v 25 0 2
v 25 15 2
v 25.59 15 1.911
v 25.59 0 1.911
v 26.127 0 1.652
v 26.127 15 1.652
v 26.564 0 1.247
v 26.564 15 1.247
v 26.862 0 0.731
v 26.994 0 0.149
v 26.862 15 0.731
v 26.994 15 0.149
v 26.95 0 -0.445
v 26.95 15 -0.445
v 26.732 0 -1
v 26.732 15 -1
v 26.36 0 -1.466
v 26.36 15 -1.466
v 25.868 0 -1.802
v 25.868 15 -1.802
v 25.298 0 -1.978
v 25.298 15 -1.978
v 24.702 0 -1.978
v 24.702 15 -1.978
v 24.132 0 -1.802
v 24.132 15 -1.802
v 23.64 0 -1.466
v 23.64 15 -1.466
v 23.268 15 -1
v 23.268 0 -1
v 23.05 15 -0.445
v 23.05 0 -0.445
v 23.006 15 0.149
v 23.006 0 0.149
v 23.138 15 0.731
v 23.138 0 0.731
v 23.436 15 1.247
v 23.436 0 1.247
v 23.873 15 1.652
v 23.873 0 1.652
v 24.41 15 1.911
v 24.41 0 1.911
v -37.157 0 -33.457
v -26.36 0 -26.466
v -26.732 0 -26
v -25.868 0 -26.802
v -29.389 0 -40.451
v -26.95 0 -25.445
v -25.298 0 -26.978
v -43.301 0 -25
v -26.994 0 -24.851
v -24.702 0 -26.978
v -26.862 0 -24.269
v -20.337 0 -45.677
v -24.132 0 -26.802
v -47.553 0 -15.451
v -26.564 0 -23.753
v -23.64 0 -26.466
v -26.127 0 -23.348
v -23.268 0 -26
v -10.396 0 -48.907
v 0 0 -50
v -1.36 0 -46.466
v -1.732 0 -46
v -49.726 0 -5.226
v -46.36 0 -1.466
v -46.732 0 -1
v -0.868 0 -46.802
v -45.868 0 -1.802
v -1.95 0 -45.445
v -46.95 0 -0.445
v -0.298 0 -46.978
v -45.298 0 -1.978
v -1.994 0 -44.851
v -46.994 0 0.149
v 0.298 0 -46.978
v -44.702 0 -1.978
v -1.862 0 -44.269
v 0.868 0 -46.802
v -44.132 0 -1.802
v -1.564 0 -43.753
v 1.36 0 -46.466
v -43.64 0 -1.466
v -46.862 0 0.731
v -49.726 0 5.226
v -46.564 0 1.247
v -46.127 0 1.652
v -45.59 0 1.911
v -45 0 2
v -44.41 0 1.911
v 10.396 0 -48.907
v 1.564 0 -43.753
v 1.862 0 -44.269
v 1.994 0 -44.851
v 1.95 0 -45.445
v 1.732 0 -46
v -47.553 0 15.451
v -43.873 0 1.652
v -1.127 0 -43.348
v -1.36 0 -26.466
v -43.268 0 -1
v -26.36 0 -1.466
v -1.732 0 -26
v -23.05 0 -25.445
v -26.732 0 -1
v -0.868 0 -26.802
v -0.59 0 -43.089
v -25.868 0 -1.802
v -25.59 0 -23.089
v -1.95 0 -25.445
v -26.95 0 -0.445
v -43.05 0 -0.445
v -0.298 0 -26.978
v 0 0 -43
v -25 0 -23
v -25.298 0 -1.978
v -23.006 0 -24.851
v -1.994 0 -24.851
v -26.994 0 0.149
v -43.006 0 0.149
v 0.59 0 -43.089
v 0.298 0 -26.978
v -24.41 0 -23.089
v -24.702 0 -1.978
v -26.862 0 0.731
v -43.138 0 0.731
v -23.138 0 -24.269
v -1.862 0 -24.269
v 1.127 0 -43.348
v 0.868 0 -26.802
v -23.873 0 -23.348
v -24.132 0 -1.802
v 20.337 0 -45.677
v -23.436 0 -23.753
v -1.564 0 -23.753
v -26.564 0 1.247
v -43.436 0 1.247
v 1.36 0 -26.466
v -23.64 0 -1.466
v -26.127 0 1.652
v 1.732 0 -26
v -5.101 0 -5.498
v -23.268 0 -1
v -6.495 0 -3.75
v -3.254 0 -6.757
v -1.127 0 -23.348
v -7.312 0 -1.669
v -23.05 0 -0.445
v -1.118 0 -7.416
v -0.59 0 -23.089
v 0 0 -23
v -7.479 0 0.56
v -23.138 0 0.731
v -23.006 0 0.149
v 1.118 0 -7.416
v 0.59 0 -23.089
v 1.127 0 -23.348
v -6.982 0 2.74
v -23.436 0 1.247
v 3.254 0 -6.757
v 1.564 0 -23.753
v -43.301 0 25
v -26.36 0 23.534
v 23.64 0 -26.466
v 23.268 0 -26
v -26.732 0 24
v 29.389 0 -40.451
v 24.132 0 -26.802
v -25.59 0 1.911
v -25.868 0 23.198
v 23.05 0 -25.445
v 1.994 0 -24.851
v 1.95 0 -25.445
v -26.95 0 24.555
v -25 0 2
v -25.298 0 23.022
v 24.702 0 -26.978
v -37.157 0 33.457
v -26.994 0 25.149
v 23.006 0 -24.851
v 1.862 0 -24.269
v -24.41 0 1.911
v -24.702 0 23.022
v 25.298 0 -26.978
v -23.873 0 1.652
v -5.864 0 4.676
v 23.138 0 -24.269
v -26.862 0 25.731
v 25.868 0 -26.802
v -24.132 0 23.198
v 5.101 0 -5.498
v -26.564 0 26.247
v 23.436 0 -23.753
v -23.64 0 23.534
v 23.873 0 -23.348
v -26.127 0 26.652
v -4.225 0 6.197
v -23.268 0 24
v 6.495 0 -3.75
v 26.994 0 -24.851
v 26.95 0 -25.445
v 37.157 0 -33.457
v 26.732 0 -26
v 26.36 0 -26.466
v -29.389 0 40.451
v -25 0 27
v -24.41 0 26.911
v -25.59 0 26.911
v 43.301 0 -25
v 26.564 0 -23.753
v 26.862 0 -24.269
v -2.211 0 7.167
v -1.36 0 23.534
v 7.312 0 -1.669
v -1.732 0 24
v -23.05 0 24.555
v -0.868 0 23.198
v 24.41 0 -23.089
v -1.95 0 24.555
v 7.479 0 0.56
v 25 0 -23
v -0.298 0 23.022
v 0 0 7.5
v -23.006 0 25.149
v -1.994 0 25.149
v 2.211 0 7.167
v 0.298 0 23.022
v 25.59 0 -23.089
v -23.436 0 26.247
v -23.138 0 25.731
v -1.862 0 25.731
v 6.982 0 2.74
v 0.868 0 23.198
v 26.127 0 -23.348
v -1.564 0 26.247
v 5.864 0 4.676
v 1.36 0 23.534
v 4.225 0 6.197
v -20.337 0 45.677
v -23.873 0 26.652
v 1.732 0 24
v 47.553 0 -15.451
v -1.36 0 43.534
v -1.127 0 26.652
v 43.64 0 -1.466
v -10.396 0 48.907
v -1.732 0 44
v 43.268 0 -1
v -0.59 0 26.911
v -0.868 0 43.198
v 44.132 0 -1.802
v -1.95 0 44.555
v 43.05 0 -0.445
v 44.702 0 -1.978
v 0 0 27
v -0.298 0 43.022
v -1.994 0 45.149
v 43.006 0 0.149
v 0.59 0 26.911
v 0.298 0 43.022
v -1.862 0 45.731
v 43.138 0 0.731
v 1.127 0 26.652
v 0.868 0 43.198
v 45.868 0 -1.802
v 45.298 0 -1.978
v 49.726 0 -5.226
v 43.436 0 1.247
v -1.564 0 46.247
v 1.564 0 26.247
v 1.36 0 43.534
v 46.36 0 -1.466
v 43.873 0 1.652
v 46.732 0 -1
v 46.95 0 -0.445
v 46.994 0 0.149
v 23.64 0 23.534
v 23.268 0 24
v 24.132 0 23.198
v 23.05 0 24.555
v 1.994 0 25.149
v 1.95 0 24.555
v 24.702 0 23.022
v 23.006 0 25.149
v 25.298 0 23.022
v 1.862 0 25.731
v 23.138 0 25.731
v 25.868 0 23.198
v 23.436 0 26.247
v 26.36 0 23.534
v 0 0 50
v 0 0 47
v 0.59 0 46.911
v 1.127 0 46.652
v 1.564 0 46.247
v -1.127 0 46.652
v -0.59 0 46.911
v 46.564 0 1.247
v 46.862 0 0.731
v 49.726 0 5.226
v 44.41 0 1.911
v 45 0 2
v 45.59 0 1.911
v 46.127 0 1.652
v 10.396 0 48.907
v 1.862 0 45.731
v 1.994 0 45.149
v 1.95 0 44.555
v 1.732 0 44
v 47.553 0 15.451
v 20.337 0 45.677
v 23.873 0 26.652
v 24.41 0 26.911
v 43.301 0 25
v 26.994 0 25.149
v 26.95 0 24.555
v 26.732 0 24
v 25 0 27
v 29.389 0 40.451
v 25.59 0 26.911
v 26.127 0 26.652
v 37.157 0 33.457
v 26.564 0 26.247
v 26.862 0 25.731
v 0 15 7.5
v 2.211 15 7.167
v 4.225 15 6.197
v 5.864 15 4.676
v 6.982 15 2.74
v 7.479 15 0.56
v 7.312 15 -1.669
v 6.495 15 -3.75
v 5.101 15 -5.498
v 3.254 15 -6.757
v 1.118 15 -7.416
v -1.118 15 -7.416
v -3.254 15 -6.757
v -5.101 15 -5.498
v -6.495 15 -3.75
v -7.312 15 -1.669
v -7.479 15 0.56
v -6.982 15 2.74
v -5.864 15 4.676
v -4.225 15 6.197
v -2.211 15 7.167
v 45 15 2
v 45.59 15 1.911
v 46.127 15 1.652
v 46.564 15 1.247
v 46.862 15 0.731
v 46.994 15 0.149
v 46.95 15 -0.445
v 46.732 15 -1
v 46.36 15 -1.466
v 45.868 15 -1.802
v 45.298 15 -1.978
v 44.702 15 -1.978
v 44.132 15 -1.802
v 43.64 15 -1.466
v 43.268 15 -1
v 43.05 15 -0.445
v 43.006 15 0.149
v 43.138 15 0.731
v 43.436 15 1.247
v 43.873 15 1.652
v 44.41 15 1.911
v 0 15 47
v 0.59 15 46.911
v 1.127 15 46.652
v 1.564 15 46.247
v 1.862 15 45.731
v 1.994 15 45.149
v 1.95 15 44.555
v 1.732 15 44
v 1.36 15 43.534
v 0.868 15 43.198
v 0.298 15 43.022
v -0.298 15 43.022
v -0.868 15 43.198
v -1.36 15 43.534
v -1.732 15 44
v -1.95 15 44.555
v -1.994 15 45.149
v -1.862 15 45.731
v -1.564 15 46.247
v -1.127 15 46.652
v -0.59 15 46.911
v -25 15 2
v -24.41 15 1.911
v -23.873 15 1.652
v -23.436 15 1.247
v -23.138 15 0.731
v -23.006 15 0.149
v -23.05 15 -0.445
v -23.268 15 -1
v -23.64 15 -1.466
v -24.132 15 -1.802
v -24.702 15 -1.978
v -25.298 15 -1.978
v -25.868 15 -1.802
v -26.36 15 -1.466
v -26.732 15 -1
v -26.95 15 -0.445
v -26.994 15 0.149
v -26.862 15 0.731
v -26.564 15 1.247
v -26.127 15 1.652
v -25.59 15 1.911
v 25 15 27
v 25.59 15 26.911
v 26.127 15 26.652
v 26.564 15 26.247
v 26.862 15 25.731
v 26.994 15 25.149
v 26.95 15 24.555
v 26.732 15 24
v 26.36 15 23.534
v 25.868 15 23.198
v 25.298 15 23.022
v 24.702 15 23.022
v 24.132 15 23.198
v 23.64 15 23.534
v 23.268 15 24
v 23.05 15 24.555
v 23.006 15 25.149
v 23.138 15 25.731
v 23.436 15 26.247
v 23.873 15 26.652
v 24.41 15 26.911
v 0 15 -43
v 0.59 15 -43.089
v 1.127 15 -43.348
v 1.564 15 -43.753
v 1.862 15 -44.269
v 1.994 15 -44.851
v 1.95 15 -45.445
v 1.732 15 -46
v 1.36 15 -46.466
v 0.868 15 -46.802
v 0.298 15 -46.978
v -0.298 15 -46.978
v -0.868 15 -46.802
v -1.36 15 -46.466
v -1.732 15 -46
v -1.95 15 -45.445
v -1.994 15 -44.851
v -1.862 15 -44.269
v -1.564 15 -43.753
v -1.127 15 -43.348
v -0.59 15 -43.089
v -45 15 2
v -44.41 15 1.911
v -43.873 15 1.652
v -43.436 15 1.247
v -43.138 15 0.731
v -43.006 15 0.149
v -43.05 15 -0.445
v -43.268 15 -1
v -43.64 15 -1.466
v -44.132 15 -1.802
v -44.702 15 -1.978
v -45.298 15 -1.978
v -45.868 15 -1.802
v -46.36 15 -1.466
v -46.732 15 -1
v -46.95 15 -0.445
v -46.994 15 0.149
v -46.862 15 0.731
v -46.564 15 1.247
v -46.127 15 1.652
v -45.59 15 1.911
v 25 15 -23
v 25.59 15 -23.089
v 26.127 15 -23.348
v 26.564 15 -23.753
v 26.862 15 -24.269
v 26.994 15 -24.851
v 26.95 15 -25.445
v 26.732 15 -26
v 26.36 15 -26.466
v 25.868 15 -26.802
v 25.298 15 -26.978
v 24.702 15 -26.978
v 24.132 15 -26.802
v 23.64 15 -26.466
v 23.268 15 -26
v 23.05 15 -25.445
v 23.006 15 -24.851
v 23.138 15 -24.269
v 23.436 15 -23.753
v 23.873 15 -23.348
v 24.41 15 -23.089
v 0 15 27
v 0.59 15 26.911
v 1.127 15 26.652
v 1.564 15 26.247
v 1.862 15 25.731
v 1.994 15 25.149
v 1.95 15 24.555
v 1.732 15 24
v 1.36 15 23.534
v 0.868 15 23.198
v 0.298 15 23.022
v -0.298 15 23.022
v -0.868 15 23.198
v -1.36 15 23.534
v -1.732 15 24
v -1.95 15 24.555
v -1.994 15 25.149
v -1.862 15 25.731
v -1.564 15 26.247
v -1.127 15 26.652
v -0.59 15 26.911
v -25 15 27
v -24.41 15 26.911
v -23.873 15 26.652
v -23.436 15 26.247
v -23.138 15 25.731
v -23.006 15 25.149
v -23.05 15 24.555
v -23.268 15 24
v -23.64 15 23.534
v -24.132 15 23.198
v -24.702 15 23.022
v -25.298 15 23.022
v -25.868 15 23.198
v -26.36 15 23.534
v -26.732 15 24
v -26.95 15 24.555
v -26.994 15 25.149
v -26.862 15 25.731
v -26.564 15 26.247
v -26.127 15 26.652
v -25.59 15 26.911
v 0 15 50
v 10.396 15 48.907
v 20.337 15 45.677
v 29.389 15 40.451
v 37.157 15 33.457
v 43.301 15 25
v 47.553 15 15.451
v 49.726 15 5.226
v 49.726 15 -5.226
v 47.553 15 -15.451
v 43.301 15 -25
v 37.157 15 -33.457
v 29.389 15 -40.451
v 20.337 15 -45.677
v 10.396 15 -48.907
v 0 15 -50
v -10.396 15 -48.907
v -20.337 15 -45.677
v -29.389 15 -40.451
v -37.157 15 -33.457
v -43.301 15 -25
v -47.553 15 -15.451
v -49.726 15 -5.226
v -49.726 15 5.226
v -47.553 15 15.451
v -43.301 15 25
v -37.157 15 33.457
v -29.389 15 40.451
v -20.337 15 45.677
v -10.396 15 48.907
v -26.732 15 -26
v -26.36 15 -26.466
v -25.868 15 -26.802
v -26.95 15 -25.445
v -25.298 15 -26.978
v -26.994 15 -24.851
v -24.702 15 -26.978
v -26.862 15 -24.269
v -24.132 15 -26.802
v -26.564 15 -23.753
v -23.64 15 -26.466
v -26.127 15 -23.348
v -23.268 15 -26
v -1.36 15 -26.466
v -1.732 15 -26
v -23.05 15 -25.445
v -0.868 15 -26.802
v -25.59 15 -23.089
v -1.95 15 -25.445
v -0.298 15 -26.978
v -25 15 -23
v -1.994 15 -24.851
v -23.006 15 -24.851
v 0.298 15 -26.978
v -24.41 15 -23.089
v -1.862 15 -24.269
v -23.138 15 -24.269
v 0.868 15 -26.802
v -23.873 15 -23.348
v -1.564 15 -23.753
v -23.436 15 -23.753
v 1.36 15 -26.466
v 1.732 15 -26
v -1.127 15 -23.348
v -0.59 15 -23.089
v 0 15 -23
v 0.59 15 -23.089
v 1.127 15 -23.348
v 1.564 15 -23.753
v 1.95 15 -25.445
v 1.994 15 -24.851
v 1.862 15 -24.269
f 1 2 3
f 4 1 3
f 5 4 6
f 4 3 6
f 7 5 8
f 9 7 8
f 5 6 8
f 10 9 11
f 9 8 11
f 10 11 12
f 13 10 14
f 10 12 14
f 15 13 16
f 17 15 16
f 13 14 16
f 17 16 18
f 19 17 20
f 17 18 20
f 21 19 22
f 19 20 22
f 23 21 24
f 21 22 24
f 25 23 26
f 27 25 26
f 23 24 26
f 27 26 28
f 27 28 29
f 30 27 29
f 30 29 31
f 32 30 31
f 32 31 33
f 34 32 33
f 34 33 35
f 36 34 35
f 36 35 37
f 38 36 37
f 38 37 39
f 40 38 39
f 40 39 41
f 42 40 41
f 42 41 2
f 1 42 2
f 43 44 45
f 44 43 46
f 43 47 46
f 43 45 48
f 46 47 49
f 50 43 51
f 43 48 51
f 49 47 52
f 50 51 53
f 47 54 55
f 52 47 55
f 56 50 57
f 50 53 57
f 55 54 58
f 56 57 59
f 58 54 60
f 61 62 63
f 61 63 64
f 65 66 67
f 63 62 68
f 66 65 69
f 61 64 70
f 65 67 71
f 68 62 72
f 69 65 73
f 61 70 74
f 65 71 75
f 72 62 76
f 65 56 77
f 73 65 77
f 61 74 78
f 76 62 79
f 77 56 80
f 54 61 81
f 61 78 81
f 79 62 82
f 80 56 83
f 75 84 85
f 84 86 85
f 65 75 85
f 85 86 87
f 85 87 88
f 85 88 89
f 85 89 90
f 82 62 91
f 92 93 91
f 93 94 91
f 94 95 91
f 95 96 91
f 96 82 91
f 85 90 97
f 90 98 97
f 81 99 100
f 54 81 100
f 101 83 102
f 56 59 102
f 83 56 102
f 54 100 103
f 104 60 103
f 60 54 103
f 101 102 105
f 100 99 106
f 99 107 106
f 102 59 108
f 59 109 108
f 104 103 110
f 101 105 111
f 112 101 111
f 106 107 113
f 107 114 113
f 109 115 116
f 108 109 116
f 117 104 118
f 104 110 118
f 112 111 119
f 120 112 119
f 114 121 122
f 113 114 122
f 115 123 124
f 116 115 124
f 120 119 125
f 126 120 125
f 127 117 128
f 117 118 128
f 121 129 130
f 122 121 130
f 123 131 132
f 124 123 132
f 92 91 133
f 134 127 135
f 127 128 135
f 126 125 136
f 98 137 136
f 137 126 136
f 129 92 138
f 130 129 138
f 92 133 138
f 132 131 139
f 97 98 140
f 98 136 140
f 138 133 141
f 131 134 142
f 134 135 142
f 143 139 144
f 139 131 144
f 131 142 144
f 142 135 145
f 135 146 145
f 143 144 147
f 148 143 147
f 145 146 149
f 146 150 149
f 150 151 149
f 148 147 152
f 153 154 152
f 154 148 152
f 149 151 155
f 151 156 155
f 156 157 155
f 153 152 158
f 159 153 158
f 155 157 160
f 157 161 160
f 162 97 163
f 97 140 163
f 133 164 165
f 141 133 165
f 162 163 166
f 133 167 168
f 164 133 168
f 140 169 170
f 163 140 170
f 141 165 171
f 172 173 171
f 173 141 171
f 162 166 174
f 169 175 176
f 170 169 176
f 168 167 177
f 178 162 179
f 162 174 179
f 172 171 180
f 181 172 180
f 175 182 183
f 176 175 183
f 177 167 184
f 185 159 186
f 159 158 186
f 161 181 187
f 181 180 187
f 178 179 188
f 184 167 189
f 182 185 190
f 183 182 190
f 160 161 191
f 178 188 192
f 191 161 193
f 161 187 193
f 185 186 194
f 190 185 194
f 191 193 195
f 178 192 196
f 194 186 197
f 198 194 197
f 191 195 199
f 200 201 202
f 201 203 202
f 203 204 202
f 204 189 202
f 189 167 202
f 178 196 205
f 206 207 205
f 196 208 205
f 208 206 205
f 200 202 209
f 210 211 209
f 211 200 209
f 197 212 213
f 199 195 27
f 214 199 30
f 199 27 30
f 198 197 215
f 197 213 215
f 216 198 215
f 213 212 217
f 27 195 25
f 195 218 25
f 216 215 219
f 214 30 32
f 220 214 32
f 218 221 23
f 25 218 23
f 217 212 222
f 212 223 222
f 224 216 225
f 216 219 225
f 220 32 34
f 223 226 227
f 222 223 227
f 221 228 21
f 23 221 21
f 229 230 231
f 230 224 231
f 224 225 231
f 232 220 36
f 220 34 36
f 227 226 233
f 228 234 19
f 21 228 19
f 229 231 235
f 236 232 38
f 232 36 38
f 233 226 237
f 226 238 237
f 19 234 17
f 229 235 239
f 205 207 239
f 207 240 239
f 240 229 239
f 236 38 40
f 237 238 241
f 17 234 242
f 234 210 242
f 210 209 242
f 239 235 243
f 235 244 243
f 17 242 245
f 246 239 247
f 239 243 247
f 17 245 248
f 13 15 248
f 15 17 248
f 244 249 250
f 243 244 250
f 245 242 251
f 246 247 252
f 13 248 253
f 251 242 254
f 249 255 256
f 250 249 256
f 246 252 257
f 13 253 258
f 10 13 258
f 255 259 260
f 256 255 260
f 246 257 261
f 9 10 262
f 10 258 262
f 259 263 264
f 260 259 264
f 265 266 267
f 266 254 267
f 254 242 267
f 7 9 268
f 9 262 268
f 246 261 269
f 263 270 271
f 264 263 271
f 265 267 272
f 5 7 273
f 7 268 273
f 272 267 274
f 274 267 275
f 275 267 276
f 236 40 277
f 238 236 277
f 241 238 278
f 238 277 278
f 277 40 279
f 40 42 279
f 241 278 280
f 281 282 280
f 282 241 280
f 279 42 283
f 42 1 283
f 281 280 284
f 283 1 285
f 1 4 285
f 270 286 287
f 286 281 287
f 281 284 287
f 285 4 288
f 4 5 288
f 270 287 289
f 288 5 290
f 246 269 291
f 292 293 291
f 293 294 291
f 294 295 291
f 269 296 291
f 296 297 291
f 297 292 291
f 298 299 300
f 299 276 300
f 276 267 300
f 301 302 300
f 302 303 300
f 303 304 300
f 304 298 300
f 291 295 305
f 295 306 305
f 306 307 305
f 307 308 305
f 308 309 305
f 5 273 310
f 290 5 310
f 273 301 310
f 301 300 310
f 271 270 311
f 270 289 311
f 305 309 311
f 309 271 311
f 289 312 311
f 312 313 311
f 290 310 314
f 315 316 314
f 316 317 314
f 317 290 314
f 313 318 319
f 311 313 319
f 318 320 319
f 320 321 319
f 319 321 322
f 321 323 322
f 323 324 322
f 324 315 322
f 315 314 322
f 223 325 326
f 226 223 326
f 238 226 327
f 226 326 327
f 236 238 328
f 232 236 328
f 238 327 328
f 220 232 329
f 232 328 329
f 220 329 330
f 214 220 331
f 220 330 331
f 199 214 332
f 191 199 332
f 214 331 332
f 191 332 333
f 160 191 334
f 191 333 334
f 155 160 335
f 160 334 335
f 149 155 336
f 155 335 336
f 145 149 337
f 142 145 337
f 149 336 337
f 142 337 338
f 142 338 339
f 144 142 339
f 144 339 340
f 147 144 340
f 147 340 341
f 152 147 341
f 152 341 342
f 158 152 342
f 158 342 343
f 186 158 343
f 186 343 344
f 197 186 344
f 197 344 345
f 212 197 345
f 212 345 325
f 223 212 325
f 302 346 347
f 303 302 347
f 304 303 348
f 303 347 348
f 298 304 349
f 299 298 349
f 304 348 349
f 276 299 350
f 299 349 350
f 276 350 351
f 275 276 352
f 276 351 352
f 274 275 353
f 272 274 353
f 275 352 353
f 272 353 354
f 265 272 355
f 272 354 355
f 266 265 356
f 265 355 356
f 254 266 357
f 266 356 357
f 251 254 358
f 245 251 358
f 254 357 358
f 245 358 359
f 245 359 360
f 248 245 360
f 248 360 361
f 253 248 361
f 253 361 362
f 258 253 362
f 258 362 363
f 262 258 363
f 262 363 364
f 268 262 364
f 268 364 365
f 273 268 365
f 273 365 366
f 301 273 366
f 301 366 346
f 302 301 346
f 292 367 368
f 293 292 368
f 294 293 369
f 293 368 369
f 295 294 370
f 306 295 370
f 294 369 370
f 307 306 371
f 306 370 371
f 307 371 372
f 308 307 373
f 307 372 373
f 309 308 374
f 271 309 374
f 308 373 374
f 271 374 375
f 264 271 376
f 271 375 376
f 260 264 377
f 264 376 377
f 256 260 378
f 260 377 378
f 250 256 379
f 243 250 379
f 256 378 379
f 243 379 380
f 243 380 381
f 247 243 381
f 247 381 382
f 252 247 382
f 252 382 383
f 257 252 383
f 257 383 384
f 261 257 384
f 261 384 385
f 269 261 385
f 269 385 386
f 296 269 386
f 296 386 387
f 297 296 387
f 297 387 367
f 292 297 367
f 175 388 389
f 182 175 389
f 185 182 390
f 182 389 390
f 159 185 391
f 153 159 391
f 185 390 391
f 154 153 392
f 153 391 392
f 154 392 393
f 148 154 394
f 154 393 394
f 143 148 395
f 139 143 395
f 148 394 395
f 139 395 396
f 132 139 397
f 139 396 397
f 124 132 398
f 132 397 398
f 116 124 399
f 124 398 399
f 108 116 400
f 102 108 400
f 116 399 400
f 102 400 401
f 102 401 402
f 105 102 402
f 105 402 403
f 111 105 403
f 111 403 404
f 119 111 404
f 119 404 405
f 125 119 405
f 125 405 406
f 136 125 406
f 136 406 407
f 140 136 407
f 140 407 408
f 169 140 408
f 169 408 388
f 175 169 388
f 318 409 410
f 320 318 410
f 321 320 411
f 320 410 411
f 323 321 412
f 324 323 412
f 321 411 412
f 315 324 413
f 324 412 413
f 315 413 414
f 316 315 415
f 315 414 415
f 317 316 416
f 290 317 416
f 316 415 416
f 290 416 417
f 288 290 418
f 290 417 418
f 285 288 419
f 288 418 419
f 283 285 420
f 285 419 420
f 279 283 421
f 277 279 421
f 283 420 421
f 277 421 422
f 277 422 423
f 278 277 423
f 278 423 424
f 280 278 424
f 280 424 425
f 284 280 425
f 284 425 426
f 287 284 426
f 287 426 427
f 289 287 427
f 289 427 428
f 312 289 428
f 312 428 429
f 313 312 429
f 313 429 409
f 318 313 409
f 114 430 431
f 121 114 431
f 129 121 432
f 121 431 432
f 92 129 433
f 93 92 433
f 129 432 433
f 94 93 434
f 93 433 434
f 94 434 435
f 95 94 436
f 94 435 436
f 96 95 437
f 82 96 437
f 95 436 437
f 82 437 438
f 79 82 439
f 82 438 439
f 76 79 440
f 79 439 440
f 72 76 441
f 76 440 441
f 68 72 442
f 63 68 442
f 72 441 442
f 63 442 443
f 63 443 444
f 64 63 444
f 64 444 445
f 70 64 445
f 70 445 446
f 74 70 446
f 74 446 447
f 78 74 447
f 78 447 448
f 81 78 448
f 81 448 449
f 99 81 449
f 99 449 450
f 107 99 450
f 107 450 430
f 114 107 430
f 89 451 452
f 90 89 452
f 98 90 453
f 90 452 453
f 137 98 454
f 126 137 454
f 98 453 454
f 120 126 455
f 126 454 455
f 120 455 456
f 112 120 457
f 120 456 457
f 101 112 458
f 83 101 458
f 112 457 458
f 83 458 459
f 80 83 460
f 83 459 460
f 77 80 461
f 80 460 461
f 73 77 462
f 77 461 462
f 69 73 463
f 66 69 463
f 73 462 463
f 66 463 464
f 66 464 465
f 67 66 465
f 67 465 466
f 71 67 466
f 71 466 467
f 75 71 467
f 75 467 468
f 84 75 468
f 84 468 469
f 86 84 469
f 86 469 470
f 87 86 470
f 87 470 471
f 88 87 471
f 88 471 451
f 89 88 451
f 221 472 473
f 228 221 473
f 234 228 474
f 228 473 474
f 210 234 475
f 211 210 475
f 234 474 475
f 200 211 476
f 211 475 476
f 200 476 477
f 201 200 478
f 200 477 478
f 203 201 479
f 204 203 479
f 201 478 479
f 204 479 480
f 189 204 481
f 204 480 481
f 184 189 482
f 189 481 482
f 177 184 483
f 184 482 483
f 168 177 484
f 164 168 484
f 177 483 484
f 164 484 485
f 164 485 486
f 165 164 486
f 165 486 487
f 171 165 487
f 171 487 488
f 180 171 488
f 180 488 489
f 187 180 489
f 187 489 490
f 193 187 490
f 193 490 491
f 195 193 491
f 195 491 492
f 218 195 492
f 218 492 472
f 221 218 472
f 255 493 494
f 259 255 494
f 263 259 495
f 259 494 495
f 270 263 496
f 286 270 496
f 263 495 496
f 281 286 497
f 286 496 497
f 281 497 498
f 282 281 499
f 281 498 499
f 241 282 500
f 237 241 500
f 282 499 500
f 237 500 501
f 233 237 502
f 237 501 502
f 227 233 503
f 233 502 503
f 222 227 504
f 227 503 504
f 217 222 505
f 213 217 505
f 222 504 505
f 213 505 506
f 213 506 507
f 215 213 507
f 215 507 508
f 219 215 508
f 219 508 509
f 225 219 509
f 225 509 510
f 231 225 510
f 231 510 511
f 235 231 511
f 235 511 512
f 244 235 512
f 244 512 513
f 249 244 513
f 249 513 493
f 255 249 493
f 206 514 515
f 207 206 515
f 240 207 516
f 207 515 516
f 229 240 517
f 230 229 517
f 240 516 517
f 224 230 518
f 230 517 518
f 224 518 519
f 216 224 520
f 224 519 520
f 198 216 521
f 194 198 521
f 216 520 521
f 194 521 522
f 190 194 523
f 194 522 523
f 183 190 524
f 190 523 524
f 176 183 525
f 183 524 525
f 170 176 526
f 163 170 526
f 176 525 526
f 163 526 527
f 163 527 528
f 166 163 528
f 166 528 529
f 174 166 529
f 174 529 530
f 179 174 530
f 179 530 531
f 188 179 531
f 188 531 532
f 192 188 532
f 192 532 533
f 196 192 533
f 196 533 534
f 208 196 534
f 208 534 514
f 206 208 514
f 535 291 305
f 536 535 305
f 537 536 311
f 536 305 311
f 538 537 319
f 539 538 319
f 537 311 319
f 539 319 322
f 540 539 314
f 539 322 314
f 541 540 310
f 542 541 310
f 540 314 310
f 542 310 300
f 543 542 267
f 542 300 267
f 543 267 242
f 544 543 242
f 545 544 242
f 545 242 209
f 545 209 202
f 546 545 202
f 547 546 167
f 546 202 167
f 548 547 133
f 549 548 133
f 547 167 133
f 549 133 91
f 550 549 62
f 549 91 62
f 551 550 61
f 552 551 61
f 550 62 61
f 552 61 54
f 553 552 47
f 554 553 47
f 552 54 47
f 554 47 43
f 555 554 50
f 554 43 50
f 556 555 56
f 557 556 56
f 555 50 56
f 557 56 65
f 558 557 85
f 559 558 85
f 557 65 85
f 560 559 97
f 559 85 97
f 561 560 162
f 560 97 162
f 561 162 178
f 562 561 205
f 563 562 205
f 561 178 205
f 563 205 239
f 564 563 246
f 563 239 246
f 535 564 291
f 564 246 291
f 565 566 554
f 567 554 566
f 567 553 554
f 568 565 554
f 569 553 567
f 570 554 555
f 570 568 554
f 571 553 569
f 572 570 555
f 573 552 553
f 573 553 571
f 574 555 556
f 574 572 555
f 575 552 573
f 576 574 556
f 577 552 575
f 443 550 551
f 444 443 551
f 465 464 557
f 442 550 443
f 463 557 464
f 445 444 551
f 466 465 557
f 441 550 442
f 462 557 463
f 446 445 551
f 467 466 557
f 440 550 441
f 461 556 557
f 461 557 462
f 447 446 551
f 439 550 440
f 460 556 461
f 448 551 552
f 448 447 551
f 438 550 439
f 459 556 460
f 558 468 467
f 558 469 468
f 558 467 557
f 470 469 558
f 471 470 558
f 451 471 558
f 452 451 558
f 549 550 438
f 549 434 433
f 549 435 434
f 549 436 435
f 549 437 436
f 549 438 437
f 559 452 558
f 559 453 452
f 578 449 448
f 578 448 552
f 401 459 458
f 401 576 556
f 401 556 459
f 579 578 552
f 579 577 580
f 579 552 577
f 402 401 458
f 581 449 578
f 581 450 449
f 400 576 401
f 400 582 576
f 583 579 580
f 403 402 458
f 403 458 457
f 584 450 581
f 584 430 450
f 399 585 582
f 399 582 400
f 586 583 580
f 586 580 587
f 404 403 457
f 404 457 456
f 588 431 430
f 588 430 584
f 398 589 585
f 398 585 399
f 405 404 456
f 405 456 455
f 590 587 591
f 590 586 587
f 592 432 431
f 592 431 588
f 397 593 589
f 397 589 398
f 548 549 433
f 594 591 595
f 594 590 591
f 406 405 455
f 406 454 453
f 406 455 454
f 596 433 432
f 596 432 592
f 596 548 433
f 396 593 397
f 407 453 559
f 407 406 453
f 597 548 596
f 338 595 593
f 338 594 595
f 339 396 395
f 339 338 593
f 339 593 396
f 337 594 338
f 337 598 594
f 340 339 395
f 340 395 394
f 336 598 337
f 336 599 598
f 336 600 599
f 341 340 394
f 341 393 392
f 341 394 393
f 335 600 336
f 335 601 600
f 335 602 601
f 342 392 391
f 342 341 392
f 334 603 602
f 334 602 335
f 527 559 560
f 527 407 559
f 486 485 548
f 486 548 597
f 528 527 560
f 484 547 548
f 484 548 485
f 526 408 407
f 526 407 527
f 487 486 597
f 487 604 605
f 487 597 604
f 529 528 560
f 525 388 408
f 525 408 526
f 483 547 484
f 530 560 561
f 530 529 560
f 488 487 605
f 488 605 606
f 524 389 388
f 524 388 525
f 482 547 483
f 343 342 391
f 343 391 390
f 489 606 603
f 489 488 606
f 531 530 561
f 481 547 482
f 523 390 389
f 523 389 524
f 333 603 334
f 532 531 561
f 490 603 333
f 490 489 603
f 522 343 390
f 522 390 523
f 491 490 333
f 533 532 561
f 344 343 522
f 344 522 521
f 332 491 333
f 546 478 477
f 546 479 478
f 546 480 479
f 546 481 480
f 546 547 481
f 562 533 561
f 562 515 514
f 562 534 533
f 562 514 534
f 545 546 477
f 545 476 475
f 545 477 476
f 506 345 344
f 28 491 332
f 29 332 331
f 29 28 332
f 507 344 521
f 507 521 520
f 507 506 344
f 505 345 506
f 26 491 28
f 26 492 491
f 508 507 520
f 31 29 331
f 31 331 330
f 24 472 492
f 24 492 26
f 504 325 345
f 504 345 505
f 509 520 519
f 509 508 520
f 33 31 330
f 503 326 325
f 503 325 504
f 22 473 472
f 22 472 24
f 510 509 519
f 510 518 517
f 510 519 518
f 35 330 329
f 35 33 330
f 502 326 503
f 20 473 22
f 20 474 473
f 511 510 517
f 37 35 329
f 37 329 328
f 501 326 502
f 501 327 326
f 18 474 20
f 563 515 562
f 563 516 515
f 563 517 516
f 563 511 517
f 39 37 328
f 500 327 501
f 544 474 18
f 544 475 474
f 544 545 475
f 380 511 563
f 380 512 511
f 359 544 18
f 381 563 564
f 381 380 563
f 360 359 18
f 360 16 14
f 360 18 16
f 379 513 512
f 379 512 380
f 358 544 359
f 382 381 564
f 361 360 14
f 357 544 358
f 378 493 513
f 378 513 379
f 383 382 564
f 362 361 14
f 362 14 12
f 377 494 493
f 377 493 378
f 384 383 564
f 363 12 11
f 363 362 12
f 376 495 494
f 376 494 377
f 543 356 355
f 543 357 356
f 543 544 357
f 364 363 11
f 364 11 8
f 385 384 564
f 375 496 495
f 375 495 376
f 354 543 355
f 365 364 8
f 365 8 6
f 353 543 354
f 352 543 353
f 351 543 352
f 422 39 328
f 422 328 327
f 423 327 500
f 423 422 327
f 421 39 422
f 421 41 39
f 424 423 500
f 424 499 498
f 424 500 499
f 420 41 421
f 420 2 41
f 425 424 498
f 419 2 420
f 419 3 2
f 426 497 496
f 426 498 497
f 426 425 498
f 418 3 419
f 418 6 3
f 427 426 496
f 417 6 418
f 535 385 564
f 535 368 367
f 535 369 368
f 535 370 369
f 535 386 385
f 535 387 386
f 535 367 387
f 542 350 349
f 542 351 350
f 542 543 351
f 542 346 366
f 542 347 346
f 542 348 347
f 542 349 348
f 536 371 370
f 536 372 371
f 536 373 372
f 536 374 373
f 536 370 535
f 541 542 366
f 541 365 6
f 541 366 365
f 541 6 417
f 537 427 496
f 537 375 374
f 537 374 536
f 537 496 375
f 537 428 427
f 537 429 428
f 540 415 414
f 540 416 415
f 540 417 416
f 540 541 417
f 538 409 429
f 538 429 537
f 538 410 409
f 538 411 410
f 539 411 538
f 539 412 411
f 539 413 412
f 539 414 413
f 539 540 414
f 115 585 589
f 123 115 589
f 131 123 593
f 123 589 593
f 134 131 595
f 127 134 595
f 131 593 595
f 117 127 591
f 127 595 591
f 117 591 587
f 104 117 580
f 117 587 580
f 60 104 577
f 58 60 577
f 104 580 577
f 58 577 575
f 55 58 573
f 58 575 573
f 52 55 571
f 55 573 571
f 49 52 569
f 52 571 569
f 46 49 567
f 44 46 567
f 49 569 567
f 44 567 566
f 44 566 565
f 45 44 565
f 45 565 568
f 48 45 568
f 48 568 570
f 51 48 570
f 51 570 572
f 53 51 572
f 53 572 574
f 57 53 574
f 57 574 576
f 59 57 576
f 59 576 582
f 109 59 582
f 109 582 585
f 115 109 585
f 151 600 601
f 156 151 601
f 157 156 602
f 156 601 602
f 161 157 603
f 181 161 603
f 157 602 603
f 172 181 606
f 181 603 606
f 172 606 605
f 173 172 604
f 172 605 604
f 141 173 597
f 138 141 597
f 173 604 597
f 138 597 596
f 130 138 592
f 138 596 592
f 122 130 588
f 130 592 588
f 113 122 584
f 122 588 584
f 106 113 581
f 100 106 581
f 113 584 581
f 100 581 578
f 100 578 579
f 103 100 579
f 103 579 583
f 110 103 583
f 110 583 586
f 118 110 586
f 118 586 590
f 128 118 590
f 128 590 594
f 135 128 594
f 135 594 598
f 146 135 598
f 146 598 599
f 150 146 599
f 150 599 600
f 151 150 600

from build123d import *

# Parameters (mm, degrees)
SKETCH1_R           = 50
BOSS_EXTRUDE1_DEPTH = 15
SKETCH2_R           = 7.5
SKETCH2_R_2         = 2
CUT_EXTRUDE1_DEPTH  = 73.284161474


with BuildPart() as part:
    # Sketch1 → Boss-Extrude1 (new body)
    with BuildSketch(Plane(origin=(0, 0, 0), x_dir=(1, 0, 0), z_dir=(0, 1, 0))):
        with Locations(Location((0, 0, 0), (0, 0, 270))):
            Circle(SKETCH1_R)
    extrude(amount=BOSS_EXTRUDE1_DEPTH)

    # Sketch2 → Cut-Extrude1 (cut, through all)
    with BuildSketch(Plane(origin=(0, 15, 0), x_dir=(1, 0, 0), z_dir=(0, 1, 0))):
        with Locations(Location((0, 0, 0), (0, 0, 270))):
            Circle(SKETCH2_R)
        with Locations(Location((45, 0, 0), (0, 0, 270))):
            Circle(SKETCH2_R_2)
        with Locations(Location((0, -45, 0), (0, 0, 270))):
            Circle(SKETCH2_R_2)
        with Locations(Location((0, -25, 0), (0, 0, 270))):
            Circle(SKETCH2_R_2)
        with Locations(Location((25, -25, 0), (0, 0, 270))):
            Circle(SKETCH2_R_2)
        with Locations(Location((-25, -25, 0), (0, 0, 270))):
            Circle(SKETCH2_R_2)
        with Locations(Location((-25, 0, 0), (0, 0, 270))):
            Circle(SKETCH2_R_2)
        with Locations(Location((-45, 0, 0), (0, 0, 270))):
            Circle(SKETCH2_R_2)
        with Locations(Location((-25, 25, 0), (0, 0, 270))):
            Circle(SKETCH2_R_2)
        with Locations(Location((0, 45, 0), (0, 0, 270))):
            Circle(SKETCH2_R_2)
        with Locations(Location((0, 25, 0), (0, 0, 270))):
            Circle(SKETCH2_R_2)
        with Locations(Location((25, 25, 0), (0, 0, 270))):
            Circle(SKETCH2_R_2)
        with Locations(Location((25, 0, 0), (0, 0, 270))):
            Circle(SKETCH2_R_2)
    extrude(amount=-CUT_EXTRUDE1_DEPTH, mode=Mode.SUBTRACT)


solid = part.part
